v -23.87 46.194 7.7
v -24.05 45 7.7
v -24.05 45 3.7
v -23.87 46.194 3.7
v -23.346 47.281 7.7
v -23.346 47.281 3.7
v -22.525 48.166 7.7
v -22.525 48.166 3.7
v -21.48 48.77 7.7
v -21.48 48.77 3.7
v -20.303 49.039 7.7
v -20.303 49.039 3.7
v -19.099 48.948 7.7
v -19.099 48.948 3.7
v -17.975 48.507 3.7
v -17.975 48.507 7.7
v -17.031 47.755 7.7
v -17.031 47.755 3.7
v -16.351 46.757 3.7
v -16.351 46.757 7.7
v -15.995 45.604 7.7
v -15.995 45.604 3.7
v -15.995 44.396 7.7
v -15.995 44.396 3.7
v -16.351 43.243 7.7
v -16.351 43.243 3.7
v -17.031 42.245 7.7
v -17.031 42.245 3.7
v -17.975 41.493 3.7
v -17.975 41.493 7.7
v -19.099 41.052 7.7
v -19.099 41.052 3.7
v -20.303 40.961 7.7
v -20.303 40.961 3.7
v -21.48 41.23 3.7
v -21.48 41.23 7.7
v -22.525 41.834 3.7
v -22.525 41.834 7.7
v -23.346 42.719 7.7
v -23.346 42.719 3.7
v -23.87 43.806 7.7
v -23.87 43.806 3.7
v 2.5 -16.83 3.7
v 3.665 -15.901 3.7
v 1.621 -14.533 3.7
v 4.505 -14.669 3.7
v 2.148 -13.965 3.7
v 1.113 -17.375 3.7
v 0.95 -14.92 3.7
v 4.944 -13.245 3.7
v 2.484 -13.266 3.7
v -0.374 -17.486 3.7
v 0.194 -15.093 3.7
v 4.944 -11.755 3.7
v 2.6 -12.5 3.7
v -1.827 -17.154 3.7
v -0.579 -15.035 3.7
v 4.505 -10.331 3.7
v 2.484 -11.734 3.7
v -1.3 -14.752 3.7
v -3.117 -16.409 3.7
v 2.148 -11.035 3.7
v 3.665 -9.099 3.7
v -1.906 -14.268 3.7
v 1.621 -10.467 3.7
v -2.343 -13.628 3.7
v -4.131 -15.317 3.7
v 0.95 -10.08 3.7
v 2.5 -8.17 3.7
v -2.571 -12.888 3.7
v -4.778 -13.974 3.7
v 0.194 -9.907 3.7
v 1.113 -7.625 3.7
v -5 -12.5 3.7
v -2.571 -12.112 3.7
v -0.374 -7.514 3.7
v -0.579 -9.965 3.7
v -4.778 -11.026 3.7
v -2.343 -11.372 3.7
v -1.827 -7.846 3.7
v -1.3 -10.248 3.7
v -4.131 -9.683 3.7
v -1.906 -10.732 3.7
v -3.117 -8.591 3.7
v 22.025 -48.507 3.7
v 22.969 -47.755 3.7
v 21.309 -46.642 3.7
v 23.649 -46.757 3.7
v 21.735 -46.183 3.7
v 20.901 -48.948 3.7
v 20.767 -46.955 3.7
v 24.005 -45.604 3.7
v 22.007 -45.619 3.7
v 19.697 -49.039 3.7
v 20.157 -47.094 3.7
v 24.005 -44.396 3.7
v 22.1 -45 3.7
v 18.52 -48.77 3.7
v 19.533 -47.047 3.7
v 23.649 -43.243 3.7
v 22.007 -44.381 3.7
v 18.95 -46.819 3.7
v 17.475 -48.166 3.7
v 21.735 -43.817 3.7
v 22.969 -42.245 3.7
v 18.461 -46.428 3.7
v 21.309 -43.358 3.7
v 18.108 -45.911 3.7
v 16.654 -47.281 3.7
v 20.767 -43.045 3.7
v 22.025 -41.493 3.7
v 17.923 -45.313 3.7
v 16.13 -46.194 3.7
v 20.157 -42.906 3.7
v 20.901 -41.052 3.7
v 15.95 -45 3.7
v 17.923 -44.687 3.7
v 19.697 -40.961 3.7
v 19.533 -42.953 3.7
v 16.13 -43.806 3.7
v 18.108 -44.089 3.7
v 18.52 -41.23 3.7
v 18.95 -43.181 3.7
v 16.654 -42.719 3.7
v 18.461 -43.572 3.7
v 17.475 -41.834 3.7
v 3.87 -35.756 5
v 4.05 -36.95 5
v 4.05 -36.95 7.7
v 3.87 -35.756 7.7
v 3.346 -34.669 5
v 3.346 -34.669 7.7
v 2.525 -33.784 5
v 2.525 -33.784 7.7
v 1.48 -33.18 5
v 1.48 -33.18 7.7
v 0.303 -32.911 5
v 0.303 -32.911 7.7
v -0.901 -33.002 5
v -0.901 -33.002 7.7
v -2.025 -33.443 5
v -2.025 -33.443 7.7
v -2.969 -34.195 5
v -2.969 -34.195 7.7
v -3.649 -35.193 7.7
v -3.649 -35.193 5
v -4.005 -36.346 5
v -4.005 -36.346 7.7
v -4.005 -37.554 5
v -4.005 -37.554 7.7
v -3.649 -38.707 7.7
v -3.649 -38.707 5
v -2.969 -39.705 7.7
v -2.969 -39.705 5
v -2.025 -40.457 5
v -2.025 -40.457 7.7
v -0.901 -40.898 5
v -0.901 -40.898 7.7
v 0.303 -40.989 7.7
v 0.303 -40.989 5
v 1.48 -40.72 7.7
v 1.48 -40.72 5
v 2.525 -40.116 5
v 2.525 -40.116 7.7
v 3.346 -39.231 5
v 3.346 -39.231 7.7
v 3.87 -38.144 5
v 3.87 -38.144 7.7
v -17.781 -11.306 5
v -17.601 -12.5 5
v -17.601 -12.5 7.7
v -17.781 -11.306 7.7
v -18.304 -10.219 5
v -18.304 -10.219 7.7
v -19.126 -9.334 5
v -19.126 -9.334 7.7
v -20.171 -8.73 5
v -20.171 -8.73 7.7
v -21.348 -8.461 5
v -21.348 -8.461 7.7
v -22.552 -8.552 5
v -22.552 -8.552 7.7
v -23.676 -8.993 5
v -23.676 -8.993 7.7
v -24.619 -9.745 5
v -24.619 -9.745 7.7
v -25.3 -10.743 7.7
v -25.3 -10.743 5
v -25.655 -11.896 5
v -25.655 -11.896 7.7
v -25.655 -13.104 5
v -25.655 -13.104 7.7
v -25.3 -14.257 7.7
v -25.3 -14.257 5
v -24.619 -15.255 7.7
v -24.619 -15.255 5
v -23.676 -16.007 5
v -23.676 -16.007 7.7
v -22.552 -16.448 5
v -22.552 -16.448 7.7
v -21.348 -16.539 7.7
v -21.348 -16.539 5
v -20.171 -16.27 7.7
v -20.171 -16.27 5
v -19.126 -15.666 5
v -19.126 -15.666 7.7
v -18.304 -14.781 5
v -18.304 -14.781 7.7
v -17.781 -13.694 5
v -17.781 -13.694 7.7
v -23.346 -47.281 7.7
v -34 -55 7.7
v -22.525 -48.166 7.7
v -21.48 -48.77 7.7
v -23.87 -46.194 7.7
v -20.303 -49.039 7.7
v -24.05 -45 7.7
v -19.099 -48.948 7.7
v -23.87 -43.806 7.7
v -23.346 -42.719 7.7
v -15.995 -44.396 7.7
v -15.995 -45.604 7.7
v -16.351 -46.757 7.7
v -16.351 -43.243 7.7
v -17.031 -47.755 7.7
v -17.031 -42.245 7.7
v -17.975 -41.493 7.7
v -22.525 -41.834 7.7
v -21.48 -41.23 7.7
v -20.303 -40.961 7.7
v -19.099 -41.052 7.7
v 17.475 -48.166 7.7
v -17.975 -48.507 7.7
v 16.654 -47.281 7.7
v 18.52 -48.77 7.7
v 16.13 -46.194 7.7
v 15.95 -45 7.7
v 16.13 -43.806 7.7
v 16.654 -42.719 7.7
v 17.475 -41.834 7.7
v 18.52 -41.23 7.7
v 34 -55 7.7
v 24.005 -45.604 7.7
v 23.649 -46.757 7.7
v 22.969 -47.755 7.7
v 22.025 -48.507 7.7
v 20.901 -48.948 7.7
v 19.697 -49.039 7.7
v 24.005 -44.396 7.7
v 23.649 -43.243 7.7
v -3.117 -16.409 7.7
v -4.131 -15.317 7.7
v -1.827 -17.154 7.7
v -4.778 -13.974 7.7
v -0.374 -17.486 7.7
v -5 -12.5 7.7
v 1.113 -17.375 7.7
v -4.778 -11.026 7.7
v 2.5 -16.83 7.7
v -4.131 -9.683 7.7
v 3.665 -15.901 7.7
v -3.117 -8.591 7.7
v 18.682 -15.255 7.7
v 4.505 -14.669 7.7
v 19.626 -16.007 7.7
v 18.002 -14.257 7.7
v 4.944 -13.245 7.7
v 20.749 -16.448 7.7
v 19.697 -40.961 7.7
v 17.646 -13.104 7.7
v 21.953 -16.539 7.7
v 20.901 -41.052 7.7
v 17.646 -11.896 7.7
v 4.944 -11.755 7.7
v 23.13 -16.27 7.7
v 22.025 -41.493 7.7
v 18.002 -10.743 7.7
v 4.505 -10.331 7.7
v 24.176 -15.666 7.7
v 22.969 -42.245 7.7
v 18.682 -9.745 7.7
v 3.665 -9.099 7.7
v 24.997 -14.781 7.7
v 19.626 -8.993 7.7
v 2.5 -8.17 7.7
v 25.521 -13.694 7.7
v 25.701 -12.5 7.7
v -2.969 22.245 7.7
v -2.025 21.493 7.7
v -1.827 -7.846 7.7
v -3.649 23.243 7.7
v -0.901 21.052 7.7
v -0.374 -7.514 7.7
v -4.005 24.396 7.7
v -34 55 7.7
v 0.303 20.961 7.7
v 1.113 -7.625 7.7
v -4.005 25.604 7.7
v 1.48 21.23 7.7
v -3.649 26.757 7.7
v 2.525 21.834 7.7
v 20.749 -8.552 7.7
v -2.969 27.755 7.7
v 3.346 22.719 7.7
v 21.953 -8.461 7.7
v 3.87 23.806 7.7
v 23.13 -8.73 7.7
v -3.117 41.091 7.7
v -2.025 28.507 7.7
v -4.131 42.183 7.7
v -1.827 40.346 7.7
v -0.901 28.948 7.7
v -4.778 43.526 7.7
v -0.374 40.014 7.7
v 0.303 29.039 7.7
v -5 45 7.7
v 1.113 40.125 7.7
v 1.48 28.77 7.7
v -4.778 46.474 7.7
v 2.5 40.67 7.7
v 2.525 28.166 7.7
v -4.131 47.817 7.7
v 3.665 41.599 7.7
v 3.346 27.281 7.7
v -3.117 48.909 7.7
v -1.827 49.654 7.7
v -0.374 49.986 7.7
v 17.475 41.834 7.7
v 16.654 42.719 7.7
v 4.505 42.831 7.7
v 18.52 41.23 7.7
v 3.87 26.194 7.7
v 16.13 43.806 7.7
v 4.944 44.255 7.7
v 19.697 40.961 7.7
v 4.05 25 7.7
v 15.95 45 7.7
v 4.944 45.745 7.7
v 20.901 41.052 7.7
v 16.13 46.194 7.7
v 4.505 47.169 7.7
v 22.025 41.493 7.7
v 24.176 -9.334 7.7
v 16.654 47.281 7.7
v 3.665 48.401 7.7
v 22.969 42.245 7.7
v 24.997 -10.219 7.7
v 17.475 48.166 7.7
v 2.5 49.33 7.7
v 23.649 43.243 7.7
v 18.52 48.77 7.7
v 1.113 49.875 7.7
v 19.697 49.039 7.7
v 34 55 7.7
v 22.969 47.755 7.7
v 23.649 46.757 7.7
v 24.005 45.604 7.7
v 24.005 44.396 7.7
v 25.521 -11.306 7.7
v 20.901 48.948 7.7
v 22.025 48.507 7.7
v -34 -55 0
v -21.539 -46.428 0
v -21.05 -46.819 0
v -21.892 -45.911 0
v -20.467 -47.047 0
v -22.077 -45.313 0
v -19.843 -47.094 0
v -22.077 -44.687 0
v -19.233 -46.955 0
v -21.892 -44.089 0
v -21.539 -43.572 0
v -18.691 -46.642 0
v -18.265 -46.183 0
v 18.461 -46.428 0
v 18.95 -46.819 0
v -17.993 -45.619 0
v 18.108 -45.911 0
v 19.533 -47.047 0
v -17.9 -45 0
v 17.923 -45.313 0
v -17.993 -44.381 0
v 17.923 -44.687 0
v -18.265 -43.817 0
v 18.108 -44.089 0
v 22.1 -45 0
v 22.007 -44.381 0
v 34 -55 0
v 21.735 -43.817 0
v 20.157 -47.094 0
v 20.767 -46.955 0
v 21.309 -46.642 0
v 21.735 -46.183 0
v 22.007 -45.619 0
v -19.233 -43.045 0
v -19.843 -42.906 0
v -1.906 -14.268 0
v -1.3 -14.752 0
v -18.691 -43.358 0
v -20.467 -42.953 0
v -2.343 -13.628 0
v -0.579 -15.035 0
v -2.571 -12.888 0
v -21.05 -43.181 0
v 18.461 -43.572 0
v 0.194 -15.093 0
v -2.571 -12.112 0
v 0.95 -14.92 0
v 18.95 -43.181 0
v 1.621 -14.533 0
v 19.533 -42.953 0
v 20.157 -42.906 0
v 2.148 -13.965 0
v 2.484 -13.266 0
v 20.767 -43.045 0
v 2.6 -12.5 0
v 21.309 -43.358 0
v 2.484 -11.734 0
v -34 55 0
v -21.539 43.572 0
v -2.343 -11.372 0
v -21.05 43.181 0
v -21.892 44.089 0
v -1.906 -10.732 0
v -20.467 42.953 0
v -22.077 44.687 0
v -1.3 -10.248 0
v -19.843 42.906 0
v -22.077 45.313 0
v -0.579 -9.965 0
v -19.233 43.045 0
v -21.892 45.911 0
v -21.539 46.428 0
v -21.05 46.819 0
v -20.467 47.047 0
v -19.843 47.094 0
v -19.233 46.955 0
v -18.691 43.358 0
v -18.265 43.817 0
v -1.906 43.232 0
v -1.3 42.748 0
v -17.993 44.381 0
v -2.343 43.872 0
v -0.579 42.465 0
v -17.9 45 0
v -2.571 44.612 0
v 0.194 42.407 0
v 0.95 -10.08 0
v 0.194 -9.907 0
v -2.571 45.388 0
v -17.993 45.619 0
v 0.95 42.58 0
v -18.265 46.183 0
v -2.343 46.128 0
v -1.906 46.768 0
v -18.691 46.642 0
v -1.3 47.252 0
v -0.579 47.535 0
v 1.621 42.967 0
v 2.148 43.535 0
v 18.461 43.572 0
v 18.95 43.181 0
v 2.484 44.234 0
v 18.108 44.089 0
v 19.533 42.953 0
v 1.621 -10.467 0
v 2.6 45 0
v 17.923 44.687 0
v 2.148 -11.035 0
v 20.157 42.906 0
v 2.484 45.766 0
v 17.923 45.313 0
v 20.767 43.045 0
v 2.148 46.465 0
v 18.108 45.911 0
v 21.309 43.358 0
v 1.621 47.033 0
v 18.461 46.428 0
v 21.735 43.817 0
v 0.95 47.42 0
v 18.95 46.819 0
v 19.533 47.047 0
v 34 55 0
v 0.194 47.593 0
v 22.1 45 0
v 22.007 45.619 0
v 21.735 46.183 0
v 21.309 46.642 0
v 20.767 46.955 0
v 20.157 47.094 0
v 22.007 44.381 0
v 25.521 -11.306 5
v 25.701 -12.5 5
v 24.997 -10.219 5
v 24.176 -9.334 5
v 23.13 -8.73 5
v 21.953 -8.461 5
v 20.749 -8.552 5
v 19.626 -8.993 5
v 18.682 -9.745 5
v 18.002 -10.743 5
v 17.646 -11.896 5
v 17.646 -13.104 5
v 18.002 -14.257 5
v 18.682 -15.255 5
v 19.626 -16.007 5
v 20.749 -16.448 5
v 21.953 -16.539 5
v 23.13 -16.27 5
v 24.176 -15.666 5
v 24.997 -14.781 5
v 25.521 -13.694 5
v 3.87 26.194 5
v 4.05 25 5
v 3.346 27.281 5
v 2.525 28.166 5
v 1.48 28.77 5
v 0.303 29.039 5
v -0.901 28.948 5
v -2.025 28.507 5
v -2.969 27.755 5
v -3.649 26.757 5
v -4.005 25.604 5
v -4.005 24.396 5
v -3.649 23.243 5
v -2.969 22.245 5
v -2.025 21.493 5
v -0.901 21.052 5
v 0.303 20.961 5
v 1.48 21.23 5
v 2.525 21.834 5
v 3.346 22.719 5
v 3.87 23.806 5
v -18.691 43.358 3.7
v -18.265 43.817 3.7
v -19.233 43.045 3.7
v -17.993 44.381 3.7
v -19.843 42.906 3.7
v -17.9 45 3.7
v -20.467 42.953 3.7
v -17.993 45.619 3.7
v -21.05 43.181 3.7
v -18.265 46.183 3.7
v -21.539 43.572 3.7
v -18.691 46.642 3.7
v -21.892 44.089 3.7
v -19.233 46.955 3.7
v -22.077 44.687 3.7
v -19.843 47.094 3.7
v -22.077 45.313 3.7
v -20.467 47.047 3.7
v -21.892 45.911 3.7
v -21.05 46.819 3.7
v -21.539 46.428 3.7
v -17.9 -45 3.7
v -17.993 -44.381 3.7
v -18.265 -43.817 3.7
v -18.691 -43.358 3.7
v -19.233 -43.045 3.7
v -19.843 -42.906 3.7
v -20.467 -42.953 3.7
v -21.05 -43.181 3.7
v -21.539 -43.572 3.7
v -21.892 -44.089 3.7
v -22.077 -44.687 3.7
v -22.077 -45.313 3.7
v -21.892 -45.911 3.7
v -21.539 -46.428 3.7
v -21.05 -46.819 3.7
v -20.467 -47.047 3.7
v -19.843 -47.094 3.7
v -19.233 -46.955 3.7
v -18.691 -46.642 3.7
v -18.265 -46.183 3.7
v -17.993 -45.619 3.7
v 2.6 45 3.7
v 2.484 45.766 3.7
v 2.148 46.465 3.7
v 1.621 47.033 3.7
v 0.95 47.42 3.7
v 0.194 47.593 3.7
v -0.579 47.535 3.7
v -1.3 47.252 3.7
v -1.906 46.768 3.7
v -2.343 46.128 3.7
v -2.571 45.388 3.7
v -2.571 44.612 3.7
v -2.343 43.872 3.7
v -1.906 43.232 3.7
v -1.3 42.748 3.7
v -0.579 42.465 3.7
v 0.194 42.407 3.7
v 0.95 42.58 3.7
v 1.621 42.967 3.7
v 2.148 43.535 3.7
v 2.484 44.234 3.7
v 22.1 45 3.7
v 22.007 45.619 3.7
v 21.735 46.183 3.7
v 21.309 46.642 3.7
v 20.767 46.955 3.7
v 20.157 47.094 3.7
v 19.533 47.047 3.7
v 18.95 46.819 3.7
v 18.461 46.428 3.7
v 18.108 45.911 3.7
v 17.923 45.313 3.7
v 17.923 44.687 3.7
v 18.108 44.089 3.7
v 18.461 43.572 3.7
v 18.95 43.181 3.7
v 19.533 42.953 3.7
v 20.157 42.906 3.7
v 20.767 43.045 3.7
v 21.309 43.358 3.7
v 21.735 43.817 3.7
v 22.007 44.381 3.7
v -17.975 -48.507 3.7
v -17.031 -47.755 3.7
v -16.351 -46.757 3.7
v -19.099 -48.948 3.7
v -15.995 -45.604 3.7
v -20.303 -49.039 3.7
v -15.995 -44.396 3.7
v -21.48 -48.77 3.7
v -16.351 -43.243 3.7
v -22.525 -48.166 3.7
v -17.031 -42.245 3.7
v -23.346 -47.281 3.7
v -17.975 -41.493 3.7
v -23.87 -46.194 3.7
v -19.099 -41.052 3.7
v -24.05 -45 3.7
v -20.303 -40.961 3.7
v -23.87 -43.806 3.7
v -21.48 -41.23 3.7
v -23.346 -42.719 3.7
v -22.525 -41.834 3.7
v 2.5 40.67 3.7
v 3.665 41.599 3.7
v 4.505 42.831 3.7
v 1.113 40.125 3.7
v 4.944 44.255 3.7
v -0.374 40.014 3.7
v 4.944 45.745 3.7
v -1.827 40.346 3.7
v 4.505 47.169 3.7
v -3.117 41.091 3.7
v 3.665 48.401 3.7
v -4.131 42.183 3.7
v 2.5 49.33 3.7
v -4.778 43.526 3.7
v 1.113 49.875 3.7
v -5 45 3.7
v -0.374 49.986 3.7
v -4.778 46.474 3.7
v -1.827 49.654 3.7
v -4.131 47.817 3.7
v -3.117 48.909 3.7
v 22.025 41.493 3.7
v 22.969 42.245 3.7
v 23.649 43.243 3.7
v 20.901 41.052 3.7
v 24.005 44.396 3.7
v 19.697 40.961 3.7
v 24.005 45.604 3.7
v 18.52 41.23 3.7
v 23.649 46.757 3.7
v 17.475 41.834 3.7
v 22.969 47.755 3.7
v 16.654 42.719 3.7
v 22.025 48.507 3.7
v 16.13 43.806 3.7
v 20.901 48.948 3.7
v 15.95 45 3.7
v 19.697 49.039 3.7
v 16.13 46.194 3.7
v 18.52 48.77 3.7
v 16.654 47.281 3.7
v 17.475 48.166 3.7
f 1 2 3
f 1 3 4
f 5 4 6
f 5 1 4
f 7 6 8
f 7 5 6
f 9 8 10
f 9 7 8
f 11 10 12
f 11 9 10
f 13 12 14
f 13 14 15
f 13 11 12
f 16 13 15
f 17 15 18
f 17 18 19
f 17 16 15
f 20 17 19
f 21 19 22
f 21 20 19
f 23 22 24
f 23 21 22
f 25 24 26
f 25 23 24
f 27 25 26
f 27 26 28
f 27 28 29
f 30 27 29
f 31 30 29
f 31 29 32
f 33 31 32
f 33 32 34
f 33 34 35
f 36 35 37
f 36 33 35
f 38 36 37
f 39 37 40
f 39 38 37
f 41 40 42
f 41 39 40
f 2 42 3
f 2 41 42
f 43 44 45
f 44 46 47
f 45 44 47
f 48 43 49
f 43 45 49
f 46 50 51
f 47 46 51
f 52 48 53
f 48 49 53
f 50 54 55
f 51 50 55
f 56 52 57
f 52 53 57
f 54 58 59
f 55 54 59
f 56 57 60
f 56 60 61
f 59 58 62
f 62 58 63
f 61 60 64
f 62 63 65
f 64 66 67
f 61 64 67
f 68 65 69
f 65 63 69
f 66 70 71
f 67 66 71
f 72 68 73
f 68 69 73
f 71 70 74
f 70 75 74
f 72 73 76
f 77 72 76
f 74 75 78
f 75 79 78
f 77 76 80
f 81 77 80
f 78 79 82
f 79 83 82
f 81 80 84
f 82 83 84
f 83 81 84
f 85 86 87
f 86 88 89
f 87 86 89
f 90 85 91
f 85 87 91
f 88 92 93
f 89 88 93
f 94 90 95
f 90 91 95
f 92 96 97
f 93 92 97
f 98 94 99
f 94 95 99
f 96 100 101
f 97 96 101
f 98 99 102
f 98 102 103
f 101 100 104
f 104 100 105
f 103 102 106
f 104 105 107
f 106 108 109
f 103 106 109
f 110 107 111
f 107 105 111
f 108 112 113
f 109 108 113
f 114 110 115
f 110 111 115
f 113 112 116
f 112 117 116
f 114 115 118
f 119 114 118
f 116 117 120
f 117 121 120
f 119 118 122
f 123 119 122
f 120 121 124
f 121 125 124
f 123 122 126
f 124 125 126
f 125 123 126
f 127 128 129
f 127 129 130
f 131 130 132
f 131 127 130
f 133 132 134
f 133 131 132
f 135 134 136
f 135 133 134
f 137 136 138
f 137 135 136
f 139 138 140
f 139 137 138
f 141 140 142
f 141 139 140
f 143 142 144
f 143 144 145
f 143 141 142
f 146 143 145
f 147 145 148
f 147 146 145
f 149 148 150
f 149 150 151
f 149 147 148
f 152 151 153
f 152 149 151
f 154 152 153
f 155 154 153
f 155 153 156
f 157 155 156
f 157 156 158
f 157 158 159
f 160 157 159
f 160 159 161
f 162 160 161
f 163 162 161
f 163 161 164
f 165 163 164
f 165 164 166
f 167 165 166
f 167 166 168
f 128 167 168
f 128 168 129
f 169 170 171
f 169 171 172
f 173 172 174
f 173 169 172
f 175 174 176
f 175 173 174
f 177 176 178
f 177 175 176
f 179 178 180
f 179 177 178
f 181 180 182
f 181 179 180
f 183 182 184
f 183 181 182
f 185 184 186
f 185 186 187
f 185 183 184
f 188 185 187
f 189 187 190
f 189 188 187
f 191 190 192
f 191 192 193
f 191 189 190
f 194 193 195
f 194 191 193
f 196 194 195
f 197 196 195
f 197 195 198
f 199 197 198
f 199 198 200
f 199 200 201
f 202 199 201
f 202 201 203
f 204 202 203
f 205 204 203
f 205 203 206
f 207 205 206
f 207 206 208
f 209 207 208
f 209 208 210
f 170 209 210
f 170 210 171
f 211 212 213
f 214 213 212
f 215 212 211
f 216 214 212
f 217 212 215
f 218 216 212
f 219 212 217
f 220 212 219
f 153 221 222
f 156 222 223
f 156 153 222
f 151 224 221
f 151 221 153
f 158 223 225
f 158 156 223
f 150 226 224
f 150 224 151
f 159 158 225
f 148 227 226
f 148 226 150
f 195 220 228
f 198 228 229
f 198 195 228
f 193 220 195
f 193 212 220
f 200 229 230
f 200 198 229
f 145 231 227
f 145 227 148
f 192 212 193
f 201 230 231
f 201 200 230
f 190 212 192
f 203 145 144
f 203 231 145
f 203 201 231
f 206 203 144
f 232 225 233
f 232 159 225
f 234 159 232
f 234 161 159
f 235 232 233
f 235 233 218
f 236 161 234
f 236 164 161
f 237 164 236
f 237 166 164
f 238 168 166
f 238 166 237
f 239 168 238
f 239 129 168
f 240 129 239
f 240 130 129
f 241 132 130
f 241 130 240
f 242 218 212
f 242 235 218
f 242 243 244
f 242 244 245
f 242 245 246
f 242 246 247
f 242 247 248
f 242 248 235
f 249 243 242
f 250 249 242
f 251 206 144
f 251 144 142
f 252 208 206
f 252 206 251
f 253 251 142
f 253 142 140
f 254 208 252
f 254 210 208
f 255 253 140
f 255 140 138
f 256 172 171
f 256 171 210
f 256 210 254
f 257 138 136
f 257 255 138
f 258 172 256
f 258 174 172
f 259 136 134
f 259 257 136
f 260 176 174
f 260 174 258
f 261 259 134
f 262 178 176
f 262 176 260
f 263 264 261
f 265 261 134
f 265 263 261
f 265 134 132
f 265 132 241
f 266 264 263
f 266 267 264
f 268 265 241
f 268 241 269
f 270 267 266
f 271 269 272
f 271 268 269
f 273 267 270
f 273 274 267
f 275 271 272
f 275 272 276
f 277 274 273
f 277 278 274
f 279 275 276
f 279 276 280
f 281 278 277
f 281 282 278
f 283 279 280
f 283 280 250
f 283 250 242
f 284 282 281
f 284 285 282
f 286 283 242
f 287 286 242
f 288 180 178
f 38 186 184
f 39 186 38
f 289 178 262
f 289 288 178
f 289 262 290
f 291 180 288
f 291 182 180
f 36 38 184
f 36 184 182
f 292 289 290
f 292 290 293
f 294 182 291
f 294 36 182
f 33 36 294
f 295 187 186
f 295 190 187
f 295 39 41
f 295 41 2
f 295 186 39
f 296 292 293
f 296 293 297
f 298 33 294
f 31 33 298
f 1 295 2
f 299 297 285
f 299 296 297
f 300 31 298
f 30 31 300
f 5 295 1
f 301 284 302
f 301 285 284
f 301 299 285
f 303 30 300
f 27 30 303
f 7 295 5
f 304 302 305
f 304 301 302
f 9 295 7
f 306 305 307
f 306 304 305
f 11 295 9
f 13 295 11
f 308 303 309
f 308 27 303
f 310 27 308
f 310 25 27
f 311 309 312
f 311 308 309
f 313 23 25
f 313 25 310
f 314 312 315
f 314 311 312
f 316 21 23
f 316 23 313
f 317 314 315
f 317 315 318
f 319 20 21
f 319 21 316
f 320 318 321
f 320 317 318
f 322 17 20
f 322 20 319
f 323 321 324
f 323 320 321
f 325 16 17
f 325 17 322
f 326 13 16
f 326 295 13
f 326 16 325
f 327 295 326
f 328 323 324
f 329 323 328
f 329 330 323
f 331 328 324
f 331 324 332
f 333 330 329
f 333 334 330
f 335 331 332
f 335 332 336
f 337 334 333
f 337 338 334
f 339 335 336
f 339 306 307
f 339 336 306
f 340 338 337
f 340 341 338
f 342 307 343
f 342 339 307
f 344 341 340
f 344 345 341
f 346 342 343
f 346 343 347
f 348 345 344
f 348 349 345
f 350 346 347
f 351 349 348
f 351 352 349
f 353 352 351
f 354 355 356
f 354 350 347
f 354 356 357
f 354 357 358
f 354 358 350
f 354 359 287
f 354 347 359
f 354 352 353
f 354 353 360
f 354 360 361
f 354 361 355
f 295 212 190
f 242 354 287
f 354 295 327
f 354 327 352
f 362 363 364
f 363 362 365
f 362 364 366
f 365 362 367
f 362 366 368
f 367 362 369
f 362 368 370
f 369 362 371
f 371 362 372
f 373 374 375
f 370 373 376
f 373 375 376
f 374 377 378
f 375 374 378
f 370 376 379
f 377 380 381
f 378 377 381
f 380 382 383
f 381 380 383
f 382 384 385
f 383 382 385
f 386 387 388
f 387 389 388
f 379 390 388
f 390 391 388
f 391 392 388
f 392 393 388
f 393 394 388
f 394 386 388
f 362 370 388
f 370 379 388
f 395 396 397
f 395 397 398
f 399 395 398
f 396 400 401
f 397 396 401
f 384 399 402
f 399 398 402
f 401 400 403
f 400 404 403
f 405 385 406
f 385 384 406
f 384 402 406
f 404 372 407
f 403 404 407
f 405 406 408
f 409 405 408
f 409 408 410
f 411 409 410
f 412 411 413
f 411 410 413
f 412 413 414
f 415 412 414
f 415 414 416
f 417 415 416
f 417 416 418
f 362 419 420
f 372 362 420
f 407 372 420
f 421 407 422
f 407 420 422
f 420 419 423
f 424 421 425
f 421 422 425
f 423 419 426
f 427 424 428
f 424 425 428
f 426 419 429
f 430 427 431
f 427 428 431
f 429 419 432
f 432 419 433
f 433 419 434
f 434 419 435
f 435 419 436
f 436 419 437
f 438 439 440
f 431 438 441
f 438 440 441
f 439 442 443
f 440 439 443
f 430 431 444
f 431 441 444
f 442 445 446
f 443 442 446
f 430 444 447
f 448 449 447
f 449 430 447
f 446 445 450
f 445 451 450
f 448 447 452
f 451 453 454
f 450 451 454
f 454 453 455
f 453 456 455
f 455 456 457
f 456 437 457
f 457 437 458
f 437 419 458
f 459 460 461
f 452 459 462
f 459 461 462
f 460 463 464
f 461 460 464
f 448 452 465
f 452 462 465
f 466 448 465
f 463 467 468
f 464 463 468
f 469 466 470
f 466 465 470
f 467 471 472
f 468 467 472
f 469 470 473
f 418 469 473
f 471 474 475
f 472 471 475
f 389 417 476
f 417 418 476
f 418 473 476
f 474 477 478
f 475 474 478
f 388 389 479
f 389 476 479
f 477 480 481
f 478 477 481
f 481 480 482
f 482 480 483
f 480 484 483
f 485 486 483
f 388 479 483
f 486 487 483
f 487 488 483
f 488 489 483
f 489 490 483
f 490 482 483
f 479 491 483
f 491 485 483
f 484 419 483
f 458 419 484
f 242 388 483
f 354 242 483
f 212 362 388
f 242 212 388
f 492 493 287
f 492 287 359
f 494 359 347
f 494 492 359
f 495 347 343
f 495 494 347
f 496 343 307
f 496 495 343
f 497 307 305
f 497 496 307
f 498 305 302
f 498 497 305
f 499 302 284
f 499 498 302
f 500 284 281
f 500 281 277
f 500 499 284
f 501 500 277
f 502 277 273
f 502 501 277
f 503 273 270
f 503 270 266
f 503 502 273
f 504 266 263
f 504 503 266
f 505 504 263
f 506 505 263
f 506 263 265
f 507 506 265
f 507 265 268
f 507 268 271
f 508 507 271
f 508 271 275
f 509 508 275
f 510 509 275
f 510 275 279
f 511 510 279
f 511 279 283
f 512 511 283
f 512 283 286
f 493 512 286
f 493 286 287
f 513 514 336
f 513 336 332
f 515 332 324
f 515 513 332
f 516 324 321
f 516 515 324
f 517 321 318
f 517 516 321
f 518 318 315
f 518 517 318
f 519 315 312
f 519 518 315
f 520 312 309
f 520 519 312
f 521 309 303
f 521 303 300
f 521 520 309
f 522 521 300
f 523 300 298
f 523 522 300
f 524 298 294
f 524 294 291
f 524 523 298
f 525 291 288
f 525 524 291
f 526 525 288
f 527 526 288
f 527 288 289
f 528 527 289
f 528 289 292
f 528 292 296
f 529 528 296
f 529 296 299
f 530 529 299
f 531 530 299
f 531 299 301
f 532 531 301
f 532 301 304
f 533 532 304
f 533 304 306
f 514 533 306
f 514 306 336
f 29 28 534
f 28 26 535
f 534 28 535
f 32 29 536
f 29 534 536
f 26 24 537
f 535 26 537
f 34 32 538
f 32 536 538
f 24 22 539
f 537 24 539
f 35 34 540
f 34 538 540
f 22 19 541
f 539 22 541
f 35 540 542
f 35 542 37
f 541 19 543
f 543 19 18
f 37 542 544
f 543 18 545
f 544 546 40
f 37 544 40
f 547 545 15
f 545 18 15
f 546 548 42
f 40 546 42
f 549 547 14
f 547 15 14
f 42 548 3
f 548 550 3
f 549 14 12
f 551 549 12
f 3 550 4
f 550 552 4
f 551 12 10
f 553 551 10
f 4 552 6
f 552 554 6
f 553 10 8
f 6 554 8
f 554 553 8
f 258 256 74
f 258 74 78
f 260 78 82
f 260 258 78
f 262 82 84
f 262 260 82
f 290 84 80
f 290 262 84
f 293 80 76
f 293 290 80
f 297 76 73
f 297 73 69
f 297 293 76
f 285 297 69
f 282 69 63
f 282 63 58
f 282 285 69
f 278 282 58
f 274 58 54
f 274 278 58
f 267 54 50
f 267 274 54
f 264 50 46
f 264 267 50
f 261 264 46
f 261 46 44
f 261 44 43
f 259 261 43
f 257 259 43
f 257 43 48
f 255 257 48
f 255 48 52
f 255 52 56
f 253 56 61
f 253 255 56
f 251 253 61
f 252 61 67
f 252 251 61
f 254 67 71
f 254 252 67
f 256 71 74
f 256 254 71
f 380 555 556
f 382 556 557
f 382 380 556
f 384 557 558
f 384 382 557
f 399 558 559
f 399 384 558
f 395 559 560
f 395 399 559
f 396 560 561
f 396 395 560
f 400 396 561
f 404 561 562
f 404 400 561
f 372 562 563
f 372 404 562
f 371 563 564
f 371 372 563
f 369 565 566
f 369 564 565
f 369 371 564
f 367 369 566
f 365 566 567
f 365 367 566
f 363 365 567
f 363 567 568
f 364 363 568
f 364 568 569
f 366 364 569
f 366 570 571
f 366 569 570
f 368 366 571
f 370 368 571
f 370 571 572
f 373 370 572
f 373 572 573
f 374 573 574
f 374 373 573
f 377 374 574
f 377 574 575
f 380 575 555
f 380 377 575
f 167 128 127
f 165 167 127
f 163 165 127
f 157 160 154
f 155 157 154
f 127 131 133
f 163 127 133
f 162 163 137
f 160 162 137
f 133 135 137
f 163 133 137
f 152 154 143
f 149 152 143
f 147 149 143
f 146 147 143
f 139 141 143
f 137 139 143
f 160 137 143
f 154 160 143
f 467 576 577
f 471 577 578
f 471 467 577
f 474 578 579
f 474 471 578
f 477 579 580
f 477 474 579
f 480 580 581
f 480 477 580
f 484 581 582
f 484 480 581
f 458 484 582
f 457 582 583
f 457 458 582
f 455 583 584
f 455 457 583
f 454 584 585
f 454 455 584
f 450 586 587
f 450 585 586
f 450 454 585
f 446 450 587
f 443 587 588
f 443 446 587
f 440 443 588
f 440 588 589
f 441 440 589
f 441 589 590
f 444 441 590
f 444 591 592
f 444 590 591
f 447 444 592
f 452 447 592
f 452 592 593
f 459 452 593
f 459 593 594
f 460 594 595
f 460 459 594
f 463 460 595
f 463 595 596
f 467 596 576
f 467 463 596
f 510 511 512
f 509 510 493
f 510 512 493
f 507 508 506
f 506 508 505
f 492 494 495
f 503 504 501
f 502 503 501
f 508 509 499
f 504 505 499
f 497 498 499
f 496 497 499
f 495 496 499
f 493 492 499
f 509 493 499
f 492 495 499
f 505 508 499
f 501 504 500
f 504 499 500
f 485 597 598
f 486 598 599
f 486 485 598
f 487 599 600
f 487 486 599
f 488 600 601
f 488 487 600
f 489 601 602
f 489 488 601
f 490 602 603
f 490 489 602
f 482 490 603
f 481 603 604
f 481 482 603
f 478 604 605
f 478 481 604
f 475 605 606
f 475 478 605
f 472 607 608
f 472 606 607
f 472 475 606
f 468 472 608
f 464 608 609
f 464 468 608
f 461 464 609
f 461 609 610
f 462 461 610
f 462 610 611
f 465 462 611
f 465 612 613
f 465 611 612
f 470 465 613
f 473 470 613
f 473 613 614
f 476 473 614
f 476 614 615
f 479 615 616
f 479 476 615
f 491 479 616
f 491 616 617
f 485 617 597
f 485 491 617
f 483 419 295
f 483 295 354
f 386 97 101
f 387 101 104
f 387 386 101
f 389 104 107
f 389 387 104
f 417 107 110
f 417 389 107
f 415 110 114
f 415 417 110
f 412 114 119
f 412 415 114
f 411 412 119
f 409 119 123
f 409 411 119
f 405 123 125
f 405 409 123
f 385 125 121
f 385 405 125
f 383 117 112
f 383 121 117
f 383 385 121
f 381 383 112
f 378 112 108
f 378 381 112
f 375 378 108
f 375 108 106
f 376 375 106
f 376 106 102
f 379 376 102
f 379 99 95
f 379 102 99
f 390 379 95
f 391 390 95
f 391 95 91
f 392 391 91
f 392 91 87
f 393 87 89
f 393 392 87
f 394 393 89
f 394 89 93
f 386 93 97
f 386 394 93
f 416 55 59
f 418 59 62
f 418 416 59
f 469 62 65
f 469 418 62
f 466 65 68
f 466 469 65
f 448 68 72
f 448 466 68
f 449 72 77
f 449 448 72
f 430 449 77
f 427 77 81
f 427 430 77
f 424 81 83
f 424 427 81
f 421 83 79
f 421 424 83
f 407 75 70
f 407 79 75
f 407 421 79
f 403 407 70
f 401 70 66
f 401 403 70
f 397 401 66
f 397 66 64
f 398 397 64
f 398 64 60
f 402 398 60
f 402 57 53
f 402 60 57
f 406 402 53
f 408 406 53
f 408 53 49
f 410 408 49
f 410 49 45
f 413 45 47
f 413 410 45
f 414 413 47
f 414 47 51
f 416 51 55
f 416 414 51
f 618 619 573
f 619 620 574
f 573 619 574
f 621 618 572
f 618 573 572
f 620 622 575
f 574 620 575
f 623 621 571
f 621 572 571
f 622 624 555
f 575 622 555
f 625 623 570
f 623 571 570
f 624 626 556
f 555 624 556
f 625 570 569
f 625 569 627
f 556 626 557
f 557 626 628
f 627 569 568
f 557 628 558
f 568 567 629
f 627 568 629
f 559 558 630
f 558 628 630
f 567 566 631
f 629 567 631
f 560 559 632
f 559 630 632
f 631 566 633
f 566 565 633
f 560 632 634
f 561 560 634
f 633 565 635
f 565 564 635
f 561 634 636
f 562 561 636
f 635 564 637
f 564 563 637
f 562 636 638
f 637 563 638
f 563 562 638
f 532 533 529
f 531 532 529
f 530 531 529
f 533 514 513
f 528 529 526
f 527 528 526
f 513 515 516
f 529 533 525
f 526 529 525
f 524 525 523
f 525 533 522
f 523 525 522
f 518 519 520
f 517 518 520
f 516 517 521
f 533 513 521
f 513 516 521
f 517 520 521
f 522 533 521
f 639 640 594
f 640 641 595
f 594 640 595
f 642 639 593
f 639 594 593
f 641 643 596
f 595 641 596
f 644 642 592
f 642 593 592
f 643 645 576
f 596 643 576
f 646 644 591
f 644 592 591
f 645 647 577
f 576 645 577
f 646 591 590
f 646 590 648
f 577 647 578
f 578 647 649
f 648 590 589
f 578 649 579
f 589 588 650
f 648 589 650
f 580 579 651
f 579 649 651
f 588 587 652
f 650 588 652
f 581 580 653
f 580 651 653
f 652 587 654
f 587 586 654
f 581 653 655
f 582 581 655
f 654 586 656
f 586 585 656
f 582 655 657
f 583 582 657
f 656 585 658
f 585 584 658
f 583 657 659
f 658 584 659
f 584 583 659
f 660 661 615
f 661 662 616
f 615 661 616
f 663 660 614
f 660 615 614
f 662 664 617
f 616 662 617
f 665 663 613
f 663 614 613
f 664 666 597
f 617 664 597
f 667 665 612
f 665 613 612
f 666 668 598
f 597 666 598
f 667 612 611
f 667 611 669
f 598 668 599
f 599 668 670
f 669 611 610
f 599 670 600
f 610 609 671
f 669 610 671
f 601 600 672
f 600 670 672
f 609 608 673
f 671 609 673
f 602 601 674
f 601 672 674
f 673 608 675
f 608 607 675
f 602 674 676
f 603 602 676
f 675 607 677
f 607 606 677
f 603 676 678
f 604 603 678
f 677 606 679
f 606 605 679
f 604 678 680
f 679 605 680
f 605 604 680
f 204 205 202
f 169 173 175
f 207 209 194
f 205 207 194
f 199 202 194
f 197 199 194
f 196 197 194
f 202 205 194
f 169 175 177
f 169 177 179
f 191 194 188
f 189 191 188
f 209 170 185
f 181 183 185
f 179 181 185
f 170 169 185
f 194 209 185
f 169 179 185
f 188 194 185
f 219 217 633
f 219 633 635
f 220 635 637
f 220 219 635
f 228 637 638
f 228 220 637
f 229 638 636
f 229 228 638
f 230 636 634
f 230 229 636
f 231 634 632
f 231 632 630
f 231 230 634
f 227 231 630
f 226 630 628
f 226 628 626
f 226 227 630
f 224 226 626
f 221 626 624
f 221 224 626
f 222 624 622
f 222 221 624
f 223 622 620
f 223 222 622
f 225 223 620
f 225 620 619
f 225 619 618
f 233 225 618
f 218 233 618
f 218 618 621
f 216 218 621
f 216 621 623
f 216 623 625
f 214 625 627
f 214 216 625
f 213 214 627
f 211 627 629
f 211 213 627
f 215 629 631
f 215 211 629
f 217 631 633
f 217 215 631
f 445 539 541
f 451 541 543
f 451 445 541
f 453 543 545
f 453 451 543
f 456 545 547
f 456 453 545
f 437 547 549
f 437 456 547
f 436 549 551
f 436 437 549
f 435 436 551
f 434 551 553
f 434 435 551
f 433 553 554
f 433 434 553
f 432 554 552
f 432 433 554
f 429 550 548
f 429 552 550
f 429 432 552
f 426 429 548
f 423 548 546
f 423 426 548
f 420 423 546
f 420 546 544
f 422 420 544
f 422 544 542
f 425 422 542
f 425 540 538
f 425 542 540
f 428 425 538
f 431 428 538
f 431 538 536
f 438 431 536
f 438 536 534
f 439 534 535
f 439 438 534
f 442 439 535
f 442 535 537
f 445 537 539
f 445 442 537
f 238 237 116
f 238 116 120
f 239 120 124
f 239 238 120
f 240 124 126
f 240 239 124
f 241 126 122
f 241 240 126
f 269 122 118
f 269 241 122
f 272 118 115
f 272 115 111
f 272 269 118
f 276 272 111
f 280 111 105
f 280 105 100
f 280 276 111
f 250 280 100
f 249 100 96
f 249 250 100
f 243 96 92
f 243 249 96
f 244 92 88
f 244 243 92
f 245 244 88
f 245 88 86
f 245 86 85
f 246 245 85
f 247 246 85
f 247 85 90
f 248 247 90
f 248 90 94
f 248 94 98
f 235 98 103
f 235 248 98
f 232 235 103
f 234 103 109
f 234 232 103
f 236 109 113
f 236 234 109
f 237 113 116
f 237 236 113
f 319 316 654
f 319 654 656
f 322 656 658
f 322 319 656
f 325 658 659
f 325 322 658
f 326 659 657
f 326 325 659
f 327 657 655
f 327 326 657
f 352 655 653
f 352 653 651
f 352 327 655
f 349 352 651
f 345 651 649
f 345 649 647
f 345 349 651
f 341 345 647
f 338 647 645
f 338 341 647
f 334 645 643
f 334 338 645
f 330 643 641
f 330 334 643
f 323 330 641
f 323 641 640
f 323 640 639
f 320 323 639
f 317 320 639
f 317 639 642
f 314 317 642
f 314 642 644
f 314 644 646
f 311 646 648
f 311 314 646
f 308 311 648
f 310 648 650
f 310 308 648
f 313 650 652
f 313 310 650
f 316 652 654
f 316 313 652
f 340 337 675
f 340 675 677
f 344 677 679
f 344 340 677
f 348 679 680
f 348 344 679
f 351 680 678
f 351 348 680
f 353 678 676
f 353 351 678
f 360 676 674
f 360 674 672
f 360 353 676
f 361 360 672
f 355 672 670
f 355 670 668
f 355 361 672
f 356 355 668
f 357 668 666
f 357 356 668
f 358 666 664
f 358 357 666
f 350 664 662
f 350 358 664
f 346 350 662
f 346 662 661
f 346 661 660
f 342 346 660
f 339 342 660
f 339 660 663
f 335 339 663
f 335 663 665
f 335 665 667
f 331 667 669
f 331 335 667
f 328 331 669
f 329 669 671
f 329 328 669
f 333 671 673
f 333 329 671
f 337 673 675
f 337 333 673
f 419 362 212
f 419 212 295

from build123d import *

# Parameters (mm, degrees)
SKETCH1_W           = 68
SKETCH1_H           = 110
SKETCH1_R           = 2.1
SKETCH1_R_2         = 4.05
SKETCH1_R_3         = 2.6
BOSS_EXTRUDE1_DEPTH = 7.7
SKETCH2_R           = 6.304633146
SKETCH2_R_2         = 7.334333348
SKETCH2_R_3         = 8.114040952
SKETCH2_R_4         = 11.073656437
BOSS_EXTRUDE2_DEPTH = 5
SKETCH3_R           = 4.05
SKETCH3_R_2         = 5
CUT_EXTRUDE1_DEPTH  = 4


with BuildPart() as part:
    # Sketch1 → Boss-Extrude1 (new body)
    with BuildSketch(Plane.XY):
        Rectangle(SKETCH1_W, SKETCH1_H)
        with Locations((20, 45)):
            Circle(SKETCH1_R, mode=Mode.SUBTRACT)
        with Locations((-20, 45)):
            Circle(SKETCH1_R, mode=Mode.SUBTRACT)
        with Locations((20, -45)):
            Circle(SKETCH1_R, mode=Mode.SUBTRACT)
        with Locations((-20, -45)):
            Circle(SKETCH1_R, mode=Mode.SUBTRACT)
        with Locations((21.650635095, -12.5)):
            Circle(SKETCH1_R_2, mode=Mode.SUBTRACT)
        with Locations((0, 25)):
            Circle(SKETCH1_R_2, mode=Mode.SUBTRACT)
        with Locations((-21.650635095, -12.5)):
            Circle(SKETCH1_R_2, mode=Mode.SUBTRACT)
        with Locations((0, -36.95)):
            Circle(SKETCH1_R_2, mode=Mode.SUBTRACT)
        with Locations((0, 45)):
            Circle(SKETCH1_R_3, mode=Mode.SUBTRACT)
        with Locations((0, -12.5)):
            Circle(SKETCH1_R_3, mode=Mode.SUBTRACT)
    extrude(amount=BOSS_EXTRUDE1_DEPTH)

    # Sketch2 → Boss-Extrude2 (add)
    with BuildSketch(Plane(origin=(0, 0, 0), x_dir=(-1, 0, 0), z_dir=(0, 0, -1))):
        with Locations((-21.650635095, -12.5)):
            Circle(SKETCH2_R)
        with Locations((0, 25)):
            Circle(SKETCH2_R_2)
        with Locations((21.650635095, -12.5)):
            Circle(SKETCH2_R_3)
        with Locations((0, -36.95)):
            Circle(SKETCH2_R_4)
    extrude(amount=-BOSS_EXTRUDE2_DEPTH)

    # Sketch3 → Cut-Extrude1 (cut)
    with BuildSketch(Plane(origin=(0, 0, 7.7), x_dir=(-1, 0, 0), z_dir=(0, 0, -1))):
        with Locations((-20, 45)):
            Circle(SKETCH3_R)
        with Locations((20, 45)):
            Circle(SKETCH3_R)
        with Locations((-20, -45)):
            Circle(SKETCH3_R)
        with Locations((20, -45)):
            Circle(SKETCH3_R)
        with Locations((0, 45)):
            Circle(SKETCH3_R_2)
        with Locations((0, -12.5)):
            Circle(SKETCH3_R_2)
    extrude(amount=CUT_EXTRUDE1_DEPTH, mode=Mode.SUBTRACT)


solid = part.part
